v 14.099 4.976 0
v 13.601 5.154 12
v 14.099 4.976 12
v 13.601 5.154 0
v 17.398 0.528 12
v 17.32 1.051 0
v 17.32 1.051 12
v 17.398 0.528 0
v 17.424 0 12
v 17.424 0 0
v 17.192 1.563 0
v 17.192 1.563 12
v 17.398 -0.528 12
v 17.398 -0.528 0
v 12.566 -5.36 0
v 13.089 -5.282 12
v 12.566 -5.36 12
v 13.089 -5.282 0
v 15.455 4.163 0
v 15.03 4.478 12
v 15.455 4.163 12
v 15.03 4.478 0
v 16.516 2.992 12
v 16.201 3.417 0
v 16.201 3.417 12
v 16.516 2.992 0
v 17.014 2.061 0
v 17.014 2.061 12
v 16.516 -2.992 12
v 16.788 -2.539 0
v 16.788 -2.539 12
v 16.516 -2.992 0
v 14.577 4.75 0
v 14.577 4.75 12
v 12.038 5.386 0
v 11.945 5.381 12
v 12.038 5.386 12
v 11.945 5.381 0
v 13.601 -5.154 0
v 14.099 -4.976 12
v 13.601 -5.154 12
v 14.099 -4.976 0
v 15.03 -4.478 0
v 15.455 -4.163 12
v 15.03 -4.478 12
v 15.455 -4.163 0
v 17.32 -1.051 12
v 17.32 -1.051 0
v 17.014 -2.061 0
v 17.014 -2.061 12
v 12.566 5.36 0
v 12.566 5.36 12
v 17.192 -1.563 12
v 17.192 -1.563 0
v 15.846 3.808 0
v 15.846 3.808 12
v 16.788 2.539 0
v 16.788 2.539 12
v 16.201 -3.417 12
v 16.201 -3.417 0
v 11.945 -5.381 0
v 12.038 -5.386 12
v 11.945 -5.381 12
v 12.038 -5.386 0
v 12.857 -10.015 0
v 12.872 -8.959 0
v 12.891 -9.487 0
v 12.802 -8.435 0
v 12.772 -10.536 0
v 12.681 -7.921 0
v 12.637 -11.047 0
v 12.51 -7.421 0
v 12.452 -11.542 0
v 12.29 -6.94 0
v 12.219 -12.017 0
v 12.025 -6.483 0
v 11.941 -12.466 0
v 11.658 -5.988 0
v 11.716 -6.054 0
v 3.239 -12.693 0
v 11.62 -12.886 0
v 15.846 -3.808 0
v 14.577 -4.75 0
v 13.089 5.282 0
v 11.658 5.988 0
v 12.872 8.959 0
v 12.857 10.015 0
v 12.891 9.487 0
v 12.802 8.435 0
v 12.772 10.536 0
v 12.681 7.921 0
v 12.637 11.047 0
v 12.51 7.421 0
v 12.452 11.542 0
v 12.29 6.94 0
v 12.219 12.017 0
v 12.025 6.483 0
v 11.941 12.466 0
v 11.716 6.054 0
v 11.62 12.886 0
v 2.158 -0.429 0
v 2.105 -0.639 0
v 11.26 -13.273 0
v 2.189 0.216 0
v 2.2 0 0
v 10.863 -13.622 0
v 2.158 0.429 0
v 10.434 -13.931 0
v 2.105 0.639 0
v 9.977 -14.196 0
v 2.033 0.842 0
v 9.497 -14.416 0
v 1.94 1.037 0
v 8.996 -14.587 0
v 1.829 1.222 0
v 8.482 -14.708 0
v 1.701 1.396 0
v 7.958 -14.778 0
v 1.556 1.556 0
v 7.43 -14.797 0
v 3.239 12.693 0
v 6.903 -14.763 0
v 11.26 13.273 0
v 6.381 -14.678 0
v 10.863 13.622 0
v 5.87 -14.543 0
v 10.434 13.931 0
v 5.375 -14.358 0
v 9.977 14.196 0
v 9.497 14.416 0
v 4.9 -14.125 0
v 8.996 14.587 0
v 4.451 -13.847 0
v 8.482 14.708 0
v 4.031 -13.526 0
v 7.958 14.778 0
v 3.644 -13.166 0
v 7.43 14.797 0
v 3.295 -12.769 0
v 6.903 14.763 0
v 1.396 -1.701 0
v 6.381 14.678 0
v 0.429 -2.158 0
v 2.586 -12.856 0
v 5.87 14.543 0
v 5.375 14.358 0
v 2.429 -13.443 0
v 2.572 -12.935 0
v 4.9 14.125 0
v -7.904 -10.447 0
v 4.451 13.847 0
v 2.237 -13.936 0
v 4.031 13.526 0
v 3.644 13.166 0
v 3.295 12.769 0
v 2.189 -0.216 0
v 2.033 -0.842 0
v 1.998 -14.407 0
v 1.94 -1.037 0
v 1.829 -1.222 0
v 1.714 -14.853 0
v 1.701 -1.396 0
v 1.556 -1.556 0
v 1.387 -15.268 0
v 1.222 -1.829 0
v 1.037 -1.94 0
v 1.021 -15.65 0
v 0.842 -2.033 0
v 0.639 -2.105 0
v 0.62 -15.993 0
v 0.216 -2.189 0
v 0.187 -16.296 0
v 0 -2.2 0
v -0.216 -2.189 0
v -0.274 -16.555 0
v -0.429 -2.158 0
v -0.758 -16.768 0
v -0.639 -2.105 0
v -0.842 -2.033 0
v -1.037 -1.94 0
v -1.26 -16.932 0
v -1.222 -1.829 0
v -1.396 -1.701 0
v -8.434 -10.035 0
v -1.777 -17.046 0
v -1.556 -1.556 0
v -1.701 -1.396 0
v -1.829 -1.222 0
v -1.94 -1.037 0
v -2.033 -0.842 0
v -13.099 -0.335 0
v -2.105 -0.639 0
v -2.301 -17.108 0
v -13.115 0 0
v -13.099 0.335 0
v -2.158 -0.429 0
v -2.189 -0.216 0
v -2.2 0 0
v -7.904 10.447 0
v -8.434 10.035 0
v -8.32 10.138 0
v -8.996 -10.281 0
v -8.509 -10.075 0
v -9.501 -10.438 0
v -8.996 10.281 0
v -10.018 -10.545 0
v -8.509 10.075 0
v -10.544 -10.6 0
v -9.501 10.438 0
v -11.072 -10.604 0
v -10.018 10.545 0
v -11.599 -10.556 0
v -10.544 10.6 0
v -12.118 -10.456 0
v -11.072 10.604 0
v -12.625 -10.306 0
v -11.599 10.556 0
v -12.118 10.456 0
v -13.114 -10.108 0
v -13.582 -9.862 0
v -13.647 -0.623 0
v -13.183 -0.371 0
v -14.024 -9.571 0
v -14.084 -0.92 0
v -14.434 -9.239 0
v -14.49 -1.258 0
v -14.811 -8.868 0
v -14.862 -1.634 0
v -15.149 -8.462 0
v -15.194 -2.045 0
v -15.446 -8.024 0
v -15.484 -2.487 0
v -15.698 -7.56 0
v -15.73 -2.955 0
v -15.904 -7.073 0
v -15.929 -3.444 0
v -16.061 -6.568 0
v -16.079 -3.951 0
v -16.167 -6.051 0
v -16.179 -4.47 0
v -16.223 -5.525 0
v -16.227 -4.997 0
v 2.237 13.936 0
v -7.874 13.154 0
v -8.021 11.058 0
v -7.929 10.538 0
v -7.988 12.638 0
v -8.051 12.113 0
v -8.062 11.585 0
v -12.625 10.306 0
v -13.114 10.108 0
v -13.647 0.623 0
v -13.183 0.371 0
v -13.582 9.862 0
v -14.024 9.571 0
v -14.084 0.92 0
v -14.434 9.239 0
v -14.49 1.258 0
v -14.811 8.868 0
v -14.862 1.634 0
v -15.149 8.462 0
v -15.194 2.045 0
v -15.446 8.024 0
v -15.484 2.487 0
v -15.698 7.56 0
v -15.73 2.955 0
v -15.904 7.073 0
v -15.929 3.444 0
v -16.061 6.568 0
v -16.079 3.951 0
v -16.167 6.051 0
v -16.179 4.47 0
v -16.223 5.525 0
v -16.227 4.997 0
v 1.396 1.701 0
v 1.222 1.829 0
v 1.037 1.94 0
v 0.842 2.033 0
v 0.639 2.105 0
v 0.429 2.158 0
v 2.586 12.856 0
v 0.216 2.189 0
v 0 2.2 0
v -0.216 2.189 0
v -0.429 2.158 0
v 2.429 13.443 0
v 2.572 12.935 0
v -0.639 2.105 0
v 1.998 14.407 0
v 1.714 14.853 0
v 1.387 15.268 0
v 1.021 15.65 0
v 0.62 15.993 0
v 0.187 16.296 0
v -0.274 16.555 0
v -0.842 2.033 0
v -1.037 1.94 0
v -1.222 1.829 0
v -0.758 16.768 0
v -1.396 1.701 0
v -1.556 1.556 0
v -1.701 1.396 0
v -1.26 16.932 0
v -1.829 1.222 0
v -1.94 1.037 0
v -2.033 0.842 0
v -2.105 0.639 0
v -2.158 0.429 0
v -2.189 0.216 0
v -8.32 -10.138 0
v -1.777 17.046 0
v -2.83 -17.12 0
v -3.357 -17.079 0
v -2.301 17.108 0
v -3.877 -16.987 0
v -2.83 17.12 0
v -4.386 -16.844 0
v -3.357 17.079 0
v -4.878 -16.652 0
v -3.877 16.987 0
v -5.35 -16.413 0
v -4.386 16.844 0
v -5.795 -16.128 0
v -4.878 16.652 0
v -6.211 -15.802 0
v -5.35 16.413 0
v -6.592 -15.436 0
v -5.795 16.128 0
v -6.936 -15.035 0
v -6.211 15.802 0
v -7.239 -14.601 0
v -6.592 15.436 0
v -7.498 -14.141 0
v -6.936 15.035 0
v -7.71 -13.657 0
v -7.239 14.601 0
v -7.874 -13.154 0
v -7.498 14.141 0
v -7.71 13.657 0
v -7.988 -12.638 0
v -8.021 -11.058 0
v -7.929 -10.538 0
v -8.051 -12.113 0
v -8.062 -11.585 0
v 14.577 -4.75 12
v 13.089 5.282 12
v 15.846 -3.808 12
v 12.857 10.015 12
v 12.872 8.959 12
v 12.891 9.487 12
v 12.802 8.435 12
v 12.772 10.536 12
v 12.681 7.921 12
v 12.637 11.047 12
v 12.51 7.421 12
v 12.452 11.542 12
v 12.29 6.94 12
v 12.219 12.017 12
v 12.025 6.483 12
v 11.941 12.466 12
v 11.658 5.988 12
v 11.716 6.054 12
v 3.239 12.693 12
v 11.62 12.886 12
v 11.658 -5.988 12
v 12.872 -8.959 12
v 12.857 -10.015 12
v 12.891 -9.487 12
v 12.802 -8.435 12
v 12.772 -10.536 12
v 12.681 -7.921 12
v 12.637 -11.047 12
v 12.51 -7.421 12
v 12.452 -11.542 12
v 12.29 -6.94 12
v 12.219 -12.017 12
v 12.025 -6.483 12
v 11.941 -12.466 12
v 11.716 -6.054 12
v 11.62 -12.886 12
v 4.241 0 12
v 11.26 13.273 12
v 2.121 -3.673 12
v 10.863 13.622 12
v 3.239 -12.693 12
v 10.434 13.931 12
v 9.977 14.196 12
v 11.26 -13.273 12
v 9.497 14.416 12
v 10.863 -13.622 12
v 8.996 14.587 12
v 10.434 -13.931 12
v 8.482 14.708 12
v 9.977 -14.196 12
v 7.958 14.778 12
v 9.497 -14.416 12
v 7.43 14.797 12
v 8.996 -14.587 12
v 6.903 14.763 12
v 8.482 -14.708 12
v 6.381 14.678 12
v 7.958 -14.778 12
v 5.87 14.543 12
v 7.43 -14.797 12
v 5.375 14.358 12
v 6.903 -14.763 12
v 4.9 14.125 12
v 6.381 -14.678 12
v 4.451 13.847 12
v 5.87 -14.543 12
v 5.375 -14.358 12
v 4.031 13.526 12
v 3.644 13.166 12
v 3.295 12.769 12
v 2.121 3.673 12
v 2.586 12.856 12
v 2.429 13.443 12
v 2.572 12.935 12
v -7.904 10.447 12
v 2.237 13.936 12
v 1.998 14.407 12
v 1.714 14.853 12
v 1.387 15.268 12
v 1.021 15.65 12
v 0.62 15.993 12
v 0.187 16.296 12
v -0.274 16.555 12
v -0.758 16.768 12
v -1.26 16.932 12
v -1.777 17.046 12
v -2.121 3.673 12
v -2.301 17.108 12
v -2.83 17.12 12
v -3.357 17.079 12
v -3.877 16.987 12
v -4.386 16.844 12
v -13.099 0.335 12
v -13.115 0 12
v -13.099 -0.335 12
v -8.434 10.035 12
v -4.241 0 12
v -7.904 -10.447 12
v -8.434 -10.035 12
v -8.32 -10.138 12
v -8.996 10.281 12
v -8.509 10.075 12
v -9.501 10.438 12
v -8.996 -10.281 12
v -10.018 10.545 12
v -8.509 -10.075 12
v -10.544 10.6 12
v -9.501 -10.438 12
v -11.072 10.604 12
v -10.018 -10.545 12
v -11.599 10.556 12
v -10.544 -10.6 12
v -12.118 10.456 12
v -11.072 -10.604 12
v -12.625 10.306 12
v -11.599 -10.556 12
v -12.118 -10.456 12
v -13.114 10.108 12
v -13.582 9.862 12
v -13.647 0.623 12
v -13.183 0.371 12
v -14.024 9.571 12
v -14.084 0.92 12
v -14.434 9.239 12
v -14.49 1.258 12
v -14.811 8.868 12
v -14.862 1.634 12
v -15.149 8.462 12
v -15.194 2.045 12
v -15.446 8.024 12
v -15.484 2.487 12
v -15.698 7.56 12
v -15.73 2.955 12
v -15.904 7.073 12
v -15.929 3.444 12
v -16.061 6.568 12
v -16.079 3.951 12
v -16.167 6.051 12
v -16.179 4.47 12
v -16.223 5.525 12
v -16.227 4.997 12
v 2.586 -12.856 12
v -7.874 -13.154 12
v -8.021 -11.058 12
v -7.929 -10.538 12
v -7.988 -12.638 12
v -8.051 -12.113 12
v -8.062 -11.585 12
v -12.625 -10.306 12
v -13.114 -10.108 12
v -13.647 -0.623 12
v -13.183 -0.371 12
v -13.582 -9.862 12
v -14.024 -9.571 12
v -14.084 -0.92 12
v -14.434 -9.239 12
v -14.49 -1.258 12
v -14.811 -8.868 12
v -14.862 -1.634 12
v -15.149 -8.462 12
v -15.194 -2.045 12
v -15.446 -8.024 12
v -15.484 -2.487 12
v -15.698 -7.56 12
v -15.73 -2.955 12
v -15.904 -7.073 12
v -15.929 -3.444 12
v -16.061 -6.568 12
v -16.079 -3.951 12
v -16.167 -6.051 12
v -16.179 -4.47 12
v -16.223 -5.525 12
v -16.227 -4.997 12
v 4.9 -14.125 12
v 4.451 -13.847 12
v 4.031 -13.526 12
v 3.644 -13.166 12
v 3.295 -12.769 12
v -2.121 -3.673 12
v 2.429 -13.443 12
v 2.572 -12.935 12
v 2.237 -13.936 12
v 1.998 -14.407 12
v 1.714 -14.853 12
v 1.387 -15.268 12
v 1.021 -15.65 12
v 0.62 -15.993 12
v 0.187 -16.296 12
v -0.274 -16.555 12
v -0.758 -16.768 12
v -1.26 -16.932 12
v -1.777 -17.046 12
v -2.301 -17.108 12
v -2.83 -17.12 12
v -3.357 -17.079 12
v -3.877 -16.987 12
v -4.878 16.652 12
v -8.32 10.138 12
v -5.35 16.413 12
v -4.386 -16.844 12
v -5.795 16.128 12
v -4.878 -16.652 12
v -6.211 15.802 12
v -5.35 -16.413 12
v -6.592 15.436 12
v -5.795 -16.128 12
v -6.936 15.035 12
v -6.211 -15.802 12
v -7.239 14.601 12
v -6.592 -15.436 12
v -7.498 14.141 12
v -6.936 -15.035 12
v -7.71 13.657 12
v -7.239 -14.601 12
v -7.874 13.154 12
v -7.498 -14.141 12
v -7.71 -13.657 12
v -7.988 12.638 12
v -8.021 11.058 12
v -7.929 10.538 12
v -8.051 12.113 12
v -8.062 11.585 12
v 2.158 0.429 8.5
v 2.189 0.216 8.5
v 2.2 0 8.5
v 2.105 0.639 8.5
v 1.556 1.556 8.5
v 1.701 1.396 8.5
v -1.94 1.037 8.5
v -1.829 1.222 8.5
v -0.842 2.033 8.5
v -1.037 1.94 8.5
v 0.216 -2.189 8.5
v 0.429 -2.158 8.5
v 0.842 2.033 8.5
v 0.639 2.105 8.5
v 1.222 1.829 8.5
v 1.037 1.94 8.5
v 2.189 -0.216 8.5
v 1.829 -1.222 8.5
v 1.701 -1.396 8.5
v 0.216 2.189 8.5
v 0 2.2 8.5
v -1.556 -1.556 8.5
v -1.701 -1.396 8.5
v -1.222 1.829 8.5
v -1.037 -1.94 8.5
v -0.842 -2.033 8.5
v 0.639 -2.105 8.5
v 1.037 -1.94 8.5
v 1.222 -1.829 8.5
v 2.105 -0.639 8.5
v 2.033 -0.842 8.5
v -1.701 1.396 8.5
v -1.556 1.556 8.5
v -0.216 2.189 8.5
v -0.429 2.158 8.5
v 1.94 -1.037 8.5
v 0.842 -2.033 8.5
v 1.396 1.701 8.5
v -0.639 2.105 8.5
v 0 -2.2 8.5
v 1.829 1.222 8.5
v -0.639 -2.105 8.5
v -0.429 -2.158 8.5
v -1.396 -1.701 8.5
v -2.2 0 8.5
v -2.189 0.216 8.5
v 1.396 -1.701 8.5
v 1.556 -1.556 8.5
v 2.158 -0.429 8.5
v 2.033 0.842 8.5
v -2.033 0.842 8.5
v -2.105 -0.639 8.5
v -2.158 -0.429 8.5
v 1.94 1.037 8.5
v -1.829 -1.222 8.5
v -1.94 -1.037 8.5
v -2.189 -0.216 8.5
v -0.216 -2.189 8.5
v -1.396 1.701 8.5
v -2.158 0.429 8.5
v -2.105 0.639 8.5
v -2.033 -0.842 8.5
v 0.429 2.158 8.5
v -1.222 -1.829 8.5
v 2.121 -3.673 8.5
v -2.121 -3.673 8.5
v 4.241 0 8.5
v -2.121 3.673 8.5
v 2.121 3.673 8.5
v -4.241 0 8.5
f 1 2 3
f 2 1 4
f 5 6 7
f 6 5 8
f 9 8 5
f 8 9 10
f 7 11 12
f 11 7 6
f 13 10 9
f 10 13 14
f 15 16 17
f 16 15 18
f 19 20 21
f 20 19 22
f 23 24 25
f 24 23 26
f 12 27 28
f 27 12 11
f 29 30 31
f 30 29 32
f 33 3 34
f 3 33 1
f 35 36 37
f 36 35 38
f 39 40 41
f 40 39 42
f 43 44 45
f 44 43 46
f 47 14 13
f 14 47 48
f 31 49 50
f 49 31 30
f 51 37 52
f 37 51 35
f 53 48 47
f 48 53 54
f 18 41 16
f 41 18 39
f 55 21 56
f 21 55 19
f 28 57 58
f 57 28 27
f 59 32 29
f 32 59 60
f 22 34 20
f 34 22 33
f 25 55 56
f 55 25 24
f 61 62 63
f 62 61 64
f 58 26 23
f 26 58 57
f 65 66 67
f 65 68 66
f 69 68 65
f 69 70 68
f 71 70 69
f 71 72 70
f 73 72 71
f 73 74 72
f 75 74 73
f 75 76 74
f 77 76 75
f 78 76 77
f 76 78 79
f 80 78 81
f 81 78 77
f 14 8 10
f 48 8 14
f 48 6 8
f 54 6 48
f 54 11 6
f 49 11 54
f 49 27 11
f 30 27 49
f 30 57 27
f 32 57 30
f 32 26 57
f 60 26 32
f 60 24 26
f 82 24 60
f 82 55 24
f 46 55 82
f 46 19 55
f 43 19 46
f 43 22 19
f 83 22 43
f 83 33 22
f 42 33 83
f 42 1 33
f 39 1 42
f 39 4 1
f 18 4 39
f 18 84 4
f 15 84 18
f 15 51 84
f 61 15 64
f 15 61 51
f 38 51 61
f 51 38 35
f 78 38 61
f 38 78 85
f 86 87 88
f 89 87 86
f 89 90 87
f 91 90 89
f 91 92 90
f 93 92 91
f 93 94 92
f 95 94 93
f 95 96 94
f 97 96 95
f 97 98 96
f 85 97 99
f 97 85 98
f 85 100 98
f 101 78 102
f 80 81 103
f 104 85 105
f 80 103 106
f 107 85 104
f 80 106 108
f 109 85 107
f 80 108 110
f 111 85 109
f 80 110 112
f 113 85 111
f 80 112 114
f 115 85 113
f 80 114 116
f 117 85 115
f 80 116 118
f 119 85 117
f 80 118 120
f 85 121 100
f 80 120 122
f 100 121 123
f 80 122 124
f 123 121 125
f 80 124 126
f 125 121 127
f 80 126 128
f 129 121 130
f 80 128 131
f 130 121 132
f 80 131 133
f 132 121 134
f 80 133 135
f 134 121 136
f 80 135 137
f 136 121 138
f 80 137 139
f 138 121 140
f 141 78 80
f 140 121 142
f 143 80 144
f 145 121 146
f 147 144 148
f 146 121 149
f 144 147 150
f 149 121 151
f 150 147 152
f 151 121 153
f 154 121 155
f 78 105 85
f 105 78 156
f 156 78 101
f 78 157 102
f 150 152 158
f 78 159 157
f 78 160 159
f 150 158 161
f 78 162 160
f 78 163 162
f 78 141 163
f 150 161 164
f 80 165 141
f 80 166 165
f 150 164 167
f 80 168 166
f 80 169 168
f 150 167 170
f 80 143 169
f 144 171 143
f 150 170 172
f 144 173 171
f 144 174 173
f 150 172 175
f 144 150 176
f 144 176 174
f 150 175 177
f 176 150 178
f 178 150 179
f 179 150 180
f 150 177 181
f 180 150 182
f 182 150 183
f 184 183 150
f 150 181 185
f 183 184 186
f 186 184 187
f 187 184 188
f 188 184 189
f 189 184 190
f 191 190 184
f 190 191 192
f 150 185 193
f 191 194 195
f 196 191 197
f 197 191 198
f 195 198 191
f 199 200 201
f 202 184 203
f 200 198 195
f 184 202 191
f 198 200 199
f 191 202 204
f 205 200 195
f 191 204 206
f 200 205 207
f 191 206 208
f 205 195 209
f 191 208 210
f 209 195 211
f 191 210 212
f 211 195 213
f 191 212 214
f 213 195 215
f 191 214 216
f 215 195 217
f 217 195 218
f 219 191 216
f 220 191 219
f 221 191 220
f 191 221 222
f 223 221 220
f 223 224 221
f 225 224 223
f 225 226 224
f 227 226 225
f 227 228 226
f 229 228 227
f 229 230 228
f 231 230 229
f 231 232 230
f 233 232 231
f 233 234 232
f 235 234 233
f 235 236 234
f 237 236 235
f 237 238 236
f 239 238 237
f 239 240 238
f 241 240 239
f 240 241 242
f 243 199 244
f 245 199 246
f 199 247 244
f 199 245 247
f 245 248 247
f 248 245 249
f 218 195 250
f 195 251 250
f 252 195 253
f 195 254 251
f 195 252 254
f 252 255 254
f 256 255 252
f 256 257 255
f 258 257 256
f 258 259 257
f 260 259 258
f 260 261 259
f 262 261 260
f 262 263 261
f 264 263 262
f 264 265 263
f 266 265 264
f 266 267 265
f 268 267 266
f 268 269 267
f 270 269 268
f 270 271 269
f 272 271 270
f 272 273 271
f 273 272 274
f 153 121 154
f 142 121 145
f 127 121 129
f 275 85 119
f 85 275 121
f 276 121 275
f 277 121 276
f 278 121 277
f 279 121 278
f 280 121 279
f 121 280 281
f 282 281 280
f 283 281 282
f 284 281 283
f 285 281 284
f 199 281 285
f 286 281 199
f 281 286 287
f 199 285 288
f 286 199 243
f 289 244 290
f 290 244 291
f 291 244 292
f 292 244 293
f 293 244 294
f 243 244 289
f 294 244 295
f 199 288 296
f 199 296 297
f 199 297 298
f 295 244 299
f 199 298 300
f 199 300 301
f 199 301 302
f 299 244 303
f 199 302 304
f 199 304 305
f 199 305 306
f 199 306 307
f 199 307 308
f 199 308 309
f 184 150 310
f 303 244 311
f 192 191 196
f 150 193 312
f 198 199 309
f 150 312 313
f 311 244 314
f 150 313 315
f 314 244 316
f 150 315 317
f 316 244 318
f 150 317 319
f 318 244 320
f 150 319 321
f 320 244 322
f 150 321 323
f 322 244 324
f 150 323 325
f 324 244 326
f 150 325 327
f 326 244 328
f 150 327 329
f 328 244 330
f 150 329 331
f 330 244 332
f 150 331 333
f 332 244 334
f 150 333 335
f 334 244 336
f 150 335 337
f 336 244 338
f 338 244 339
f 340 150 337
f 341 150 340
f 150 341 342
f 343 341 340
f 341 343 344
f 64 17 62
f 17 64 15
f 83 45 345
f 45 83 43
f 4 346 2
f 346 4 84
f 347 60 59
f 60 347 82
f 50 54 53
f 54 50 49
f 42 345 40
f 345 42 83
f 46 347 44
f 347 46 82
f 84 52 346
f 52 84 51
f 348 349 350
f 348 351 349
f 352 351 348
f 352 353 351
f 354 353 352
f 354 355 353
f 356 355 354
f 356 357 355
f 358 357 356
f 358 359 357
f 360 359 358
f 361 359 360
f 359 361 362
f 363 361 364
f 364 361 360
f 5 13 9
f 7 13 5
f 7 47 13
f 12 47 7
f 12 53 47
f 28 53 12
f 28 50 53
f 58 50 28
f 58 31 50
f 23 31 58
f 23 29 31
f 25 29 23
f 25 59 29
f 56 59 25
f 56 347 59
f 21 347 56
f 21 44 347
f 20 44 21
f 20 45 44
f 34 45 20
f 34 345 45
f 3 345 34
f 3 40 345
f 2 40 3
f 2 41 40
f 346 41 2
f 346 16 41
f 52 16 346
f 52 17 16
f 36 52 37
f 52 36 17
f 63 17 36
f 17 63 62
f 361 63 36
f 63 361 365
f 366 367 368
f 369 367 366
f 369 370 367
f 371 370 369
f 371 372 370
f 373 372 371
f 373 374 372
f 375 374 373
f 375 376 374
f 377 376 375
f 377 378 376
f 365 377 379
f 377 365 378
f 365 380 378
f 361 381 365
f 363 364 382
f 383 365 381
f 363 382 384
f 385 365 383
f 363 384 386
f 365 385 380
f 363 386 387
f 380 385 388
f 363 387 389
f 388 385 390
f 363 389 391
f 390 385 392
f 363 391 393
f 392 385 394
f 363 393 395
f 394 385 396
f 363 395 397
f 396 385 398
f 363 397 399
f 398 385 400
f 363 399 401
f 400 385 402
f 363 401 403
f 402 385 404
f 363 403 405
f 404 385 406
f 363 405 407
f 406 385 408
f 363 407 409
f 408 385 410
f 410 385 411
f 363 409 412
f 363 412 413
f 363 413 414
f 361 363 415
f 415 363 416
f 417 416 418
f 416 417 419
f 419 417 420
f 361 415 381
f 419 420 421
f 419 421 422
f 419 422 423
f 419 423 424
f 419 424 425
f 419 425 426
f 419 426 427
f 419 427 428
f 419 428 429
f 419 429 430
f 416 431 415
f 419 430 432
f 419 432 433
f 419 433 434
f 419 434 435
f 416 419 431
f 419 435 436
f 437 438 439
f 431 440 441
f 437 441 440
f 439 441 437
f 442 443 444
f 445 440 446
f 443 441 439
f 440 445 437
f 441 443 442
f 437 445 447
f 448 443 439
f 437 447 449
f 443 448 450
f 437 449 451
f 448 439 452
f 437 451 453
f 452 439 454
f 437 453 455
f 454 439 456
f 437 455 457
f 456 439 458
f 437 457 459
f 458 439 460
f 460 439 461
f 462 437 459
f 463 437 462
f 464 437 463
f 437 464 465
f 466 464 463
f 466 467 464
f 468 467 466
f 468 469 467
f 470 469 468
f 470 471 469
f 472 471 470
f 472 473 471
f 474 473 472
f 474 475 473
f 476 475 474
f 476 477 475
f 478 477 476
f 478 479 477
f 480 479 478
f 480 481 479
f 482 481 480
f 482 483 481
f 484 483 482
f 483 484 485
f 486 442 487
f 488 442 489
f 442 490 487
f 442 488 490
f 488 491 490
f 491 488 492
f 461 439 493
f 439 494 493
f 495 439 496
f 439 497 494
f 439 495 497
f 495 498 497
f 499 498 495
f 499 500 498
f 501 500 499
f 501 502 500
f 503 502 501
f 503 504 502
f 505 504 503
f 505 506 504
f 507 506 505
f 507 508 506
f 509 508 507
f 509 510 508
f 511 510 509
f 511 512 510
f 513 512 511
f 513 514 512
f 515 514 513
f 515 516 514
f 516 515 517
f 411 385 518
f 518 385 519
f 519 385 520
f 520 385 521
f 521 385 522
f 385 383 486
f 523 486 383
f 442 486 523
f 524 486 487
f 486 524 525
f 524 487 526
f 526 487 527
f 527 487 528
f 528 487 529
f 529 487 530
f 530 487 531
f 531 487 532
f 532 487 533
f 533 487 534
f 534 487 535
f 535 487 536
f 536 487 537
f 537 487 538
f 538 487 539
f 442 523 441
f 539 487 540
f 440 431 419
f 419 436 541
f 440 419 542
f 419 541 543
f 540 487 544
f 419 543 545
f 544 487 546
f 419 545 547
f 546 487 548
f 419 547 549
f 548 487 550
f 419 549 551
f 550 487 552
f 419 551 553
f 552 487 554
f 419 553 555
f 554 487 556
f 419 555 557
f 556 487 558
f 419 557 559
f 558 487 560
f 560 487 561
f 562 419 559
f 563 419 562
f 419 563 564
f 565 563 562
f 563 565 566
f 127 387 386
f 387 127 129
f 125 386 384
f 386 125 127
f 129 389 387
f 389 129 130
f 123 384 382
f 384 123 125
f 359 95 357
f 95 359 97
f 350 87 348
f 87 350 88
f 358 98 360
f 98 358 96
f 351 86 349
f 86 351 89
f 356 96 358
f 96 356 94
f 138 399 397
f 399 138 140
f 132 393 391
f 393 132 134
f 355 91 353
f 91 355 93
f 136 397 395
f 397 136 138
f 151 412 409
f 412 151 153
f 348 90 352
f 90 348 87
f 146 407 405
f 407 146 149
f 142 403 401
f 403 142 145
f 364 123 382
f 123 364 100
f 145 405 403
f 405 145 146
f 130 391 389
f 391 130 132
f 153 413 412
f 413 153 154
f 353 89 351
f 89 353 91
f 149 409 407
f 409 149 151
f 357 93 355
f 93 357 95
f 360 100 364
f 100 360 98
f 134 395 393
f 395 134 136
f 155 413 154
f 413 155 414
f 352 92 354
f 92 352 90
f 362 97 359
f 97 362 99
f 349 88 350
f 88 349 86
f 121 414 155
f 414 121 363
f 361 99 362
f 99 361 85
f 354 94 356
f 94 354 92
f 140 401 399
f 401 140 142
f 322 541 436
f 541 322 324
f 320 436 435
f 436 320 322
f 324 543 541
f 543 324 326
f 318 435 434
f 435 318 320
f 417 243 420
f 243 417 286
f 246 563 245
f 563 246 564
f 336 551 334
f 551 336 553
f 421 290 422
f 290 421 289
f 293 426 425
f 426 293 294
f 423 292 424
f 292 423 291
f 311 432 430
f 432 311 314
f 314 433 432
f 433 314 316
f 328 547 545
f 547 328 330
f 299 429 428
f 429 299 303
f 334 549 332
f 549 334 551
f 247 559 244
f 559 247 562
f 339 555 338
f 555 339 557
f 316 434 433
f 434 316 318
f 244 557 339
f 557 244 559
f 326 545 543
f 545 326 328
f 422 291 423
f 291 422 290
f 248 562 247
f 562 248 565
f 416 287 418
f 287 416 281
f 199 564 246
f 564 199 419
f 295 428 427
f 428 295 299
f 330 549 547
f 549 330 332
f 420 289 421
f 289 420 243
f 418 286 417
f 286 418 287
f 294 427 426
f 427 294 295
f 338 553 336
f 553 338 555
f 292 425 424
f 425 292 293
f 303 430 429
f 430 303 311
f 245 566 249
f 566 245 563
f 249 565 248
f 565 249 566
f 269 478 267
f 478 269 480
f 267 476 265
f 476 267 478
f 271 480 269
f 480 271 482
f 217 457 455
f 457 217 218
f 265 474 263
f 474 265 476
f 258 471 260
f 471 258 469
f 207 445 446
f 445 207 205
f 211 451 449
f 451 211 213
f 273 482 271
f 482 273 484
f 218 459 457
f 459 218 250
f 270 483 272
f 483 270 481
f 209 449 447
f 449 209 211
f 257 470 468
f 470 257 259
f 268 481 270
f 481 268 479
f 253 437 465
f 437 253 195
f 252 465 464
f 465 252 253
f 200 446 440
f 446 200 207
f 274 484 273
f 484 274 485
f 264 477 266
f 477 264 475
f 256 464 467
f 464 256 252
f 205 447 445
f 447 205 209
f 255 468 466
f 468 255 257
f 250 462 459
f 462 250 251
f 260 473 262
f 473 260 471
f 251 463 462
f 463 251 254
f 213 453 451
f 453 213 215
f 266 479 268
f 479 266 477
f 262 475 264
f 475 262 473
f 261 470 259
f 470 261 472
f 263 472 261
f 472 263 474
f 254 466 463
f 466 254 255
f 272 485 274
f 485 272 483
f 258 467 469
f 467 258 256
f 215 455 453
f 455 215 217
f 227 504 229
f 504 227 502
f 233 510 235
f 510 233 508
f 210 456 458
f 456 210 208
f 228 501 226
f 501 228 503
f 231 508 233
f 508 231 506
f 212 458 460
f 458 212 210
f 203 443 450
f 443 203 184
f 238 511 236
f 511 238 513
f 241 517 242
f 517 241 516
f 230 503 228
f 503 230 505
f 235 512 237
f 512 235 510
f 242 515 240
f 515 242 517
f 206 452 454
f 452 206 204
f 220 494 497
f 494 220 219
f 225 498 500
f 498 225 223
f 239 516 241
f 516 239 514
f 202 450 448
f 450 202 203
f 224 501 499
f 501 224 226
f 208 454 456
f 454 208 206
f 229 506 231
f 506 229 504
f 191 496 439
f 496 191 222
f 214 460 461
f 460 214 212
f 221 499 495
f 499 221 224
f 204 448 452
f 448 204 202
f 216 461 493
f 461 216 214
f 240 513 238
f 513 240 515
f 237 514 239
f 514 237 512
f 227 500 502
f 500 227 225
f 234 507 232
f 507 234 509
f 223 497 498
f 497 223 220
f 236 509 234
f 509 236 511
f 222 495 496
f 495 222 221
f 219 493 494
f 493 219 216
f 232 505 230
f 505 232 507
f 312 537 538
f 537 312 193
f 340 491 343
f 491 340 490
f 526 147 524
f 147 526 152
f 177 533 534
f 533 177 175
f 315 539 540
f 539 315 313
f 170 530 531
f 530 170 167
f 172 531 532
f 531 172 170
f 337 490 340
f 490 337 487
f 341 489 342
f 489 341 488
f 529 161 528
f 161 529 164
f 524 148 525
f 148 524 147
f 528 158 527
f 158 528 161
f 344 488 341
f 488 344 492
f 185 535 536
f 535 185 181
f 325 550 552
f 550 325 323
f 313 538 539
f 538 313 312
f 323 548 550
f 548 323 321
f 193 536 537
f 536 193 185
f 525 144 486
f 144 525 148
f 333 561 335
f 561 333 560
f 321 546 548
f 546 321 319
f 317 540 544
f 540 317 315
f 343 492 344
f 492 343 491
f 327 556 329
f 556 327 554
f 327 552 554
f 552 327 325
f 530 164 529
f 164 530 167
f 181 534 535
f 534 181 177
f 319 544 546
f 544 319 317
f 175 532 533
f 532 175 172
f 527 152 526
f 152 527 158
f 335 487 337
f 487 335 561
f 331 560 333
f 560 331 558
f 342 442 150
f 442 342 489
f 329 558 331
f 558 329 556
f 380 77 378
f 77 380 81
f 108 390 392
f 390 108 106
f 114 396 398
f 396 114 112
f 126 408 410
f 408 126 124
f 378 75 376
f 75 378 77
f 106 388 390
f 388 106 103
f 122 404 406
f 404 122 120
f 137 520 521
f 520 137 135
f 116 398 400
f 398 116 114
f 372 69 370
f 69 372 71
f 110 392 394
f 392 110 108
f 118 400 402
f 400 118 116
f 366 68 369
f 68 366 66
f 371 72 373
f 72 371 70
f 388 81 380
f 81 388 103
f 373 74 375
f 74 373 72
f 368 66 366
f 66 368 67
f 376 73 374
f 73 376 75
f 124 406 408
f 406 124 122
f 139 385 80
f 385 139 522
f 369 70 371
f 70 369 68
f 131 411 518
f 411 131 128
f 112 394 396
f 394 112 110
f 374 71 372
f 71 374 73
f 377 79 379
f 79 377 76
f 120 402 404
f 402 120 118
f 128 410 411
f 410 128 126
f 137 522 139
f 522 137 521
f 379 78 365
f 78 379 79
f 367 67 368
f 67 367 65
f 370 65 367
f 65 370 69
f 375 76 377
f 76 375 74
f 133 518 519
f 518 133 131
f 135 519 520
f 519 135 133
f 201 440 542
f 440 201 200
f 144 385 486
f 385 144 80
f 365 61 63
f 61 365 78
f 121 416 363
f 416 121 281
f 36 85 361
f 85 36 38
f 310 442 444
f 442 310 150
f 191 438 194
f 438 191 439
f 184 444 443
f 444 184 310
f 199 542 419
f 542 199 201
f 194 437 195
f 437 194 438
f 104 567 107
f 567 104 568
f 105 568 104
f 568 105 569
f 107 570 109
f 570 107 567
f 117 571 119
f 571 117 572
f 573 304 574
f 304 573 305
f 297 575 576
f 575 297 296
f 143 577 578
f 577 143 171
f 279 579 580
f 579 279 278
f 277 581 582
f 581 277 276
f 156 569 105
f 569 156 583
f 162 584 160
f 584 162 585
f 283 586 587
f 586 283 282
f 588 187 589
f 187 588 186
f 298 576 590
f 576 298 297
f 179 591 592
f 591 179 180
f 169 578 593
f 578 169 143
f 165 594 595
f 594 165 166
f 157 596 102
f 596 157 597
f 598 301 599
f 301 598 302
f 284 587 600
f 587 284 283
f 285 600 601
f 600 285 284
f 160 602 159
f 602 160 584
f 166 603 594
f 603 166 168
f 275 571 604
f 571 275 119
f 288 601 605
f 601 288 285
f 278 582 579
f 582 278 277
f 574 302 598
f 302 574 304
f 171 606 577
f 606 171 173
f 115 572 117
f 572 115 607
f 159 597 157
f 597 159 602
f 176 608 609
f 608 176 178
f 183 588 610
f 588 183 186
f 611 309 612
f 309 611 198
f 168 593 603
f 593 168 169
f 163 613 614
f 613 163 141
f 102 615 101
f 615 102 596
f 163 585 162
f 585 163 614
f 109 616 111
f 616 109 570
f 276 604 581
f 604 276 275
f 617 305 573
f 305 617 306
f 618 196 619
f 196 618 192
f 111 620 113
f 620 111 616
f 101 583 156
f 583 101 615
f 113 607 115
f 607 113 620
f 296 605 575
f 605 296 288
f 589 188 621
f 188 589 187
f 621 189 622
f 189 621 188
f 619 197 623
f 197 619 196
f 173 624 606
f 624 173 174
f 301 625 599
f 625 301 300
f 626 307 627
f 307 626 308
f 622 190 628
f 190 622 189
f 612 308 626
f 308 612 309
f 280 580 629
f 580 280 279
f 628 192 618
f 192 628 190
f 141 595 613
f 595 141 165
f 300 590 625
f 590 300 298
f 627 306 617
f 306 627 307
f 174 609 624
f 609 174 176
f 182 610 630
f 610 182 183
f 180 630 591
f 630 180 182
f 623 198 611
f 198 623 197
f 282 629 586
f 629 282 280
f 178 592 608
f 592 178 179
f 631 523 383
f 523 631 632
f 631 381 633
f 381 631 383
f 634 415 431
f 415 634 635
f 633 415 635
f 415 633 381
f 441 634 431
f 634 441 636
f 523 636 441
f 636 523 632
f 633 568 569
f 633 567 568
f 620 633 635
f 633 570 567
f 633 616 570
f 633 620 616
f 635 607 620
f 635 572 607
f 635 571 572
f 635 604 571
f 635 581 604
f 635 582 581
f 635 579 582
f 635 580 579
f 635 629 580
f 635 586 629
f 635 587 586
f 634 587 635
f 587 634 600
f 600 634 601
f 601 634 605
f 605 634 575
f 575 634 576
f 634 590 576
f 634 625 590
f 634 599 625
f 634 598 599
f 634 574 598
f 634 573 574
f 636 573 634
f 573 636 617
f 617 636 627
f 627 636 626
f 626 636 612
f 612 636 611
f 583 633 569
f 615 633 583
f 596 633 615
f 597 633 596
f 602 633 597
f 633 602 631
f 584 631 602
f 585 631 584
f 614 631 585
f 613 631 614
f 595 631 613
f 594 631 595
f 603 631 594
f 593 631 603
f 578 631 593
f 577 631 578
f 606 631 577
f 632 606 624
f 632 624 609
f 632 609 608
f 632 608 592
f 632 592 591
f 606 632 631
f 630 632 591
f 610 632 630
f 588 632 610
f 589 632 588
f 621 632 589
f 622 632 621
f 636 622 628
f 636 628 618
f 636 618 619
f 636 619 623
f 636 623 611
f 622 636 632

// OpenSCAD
// ========= PERILLA DE APRIETE (ejemplo) =========
// Perilla moleteada con alojamiento hexagonal para
// una tuerca M4/M5/M6: sirve para apretar a mano
// los tornillos de los soportes.

/* [Perilla] */
// Diámetro de la perilla (mm)
diametro = 30; // [15:60]
// Altura de la perilla (mm)
altura = 12; // [6:25]
// Cantidad de lóbulos de agarre
lobulos = 7; // [4:12]
// Diámetro del tornillo (mm)
tornillo = 4; // [2:8]
// Ancho de la tuerca entre caras (mm)
tuerca = 7; // [4:13]
// Profundidad del alojamiento de la tuerca (mm)
tuerca_alto = 3.5; // [2:8]

/* [Calidad] */
// Resolución de las curvas
resolucion = 64; // [24:160]

/* [Hidden] */
$fn = resolucion;
r = diametro / 2;
r_lobulo = 3.14159 * diametro / lobulos / 2 * 0.8;

difference() {
    union() {
        cylinder(h = altura, r = r - r_lobulo * 0.35);
        // Lóbulos de agarre
        for (i = [0 : lobulos - 1])
            rotate([0, 0, i * 360 / lobulos])
                translate([r - r_lobulo * 0.55, 0, 0])
                    cylinder(h = altura, r = r_lobulo);
    }
    // Pasaje del tornillo
    translate([0, 0, -1])
        cylinder(h = altura + 2, d = tornillo + 0.4);
    // Alojamiento hexagonal de la tuerca
    translate([0, 0, altura - tuerca_alto])
        cylinder(h = tuerca_alto + 1, d = tuerca / cos(30) + 0.4, $fn = 6);
}
